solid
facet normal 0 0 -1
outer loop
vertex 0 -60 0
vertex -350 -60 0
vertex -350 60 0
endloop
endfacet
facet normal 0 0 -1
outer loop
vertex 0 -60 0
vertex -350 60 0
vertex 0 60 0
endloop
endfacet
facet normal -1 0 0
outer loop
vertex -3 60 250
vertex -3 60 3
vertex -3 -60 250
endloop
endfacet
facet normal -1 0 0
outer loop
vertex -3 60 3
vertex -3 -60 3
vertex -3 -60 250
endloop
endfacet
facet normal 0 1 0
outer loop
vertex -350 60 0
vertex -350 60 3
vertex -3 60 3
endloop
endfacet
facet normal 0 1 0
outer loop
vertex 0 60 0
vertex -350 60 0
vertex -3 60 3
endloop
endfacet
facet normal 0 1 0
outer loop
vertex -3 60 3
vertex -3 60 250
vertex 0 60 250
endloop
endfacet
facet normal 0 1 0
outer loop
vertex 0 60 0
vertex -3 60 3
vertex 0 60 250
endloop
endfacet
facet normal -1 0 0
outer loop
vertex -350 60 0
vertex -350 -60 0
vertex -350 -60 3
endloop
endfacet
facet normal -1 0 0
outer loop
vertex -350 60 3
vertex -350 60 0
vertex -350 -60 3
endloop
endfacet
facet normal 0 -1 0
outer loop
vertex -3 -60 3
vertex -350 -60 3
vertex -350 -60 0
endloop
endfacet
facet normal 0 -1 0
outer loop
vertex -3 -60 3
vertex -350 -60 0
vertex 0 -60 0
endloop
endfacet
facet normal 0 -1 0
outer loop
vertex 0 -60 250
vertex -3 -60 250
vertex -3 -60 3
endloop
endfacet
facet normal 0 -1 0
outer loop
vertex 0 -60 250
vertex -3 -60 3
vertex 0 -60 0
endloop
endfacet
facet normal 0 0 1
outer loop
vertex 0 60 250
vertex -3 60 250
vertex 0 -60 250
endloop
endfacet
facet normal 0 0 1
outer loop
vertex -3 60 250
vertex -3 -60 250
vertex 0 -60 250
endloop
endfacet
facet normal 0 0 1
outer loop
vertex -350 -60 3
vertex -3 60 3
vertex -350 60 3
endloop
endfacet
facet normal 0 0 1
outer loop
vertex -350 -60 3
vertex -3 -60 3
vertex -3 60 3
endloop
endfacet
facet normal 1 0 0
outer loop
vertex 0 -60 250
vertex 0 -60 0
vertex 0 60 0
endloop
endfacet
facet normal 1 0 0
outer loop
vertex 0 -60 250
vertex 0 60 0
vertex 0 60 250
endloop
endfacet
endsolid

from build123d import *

# Parameters (mm, degrees)
F0_W     = 347
F0_H     = 3
F0_W_2   = 3
F0_H_2   = 247
F1_DEPTH = 60


with BuildPart() as f1:
    # F0 (on Front) → F1 (new body, symmetric)
    with BuildSketch(Plane.XZ):
        with Locations((-176.5, 1.5)):
            Rectangle(F0_W, F0_H)
        with Locations((-1.5, 1.5)):
            Rectangle(F0_W_2, F0_H)
        with Locations((-1.5, 126.5)):
            Rectangle(F0_W_2, F0_H_2)
    extrude(amount=F1_DEPTH, both=True)


solid = f1.part
